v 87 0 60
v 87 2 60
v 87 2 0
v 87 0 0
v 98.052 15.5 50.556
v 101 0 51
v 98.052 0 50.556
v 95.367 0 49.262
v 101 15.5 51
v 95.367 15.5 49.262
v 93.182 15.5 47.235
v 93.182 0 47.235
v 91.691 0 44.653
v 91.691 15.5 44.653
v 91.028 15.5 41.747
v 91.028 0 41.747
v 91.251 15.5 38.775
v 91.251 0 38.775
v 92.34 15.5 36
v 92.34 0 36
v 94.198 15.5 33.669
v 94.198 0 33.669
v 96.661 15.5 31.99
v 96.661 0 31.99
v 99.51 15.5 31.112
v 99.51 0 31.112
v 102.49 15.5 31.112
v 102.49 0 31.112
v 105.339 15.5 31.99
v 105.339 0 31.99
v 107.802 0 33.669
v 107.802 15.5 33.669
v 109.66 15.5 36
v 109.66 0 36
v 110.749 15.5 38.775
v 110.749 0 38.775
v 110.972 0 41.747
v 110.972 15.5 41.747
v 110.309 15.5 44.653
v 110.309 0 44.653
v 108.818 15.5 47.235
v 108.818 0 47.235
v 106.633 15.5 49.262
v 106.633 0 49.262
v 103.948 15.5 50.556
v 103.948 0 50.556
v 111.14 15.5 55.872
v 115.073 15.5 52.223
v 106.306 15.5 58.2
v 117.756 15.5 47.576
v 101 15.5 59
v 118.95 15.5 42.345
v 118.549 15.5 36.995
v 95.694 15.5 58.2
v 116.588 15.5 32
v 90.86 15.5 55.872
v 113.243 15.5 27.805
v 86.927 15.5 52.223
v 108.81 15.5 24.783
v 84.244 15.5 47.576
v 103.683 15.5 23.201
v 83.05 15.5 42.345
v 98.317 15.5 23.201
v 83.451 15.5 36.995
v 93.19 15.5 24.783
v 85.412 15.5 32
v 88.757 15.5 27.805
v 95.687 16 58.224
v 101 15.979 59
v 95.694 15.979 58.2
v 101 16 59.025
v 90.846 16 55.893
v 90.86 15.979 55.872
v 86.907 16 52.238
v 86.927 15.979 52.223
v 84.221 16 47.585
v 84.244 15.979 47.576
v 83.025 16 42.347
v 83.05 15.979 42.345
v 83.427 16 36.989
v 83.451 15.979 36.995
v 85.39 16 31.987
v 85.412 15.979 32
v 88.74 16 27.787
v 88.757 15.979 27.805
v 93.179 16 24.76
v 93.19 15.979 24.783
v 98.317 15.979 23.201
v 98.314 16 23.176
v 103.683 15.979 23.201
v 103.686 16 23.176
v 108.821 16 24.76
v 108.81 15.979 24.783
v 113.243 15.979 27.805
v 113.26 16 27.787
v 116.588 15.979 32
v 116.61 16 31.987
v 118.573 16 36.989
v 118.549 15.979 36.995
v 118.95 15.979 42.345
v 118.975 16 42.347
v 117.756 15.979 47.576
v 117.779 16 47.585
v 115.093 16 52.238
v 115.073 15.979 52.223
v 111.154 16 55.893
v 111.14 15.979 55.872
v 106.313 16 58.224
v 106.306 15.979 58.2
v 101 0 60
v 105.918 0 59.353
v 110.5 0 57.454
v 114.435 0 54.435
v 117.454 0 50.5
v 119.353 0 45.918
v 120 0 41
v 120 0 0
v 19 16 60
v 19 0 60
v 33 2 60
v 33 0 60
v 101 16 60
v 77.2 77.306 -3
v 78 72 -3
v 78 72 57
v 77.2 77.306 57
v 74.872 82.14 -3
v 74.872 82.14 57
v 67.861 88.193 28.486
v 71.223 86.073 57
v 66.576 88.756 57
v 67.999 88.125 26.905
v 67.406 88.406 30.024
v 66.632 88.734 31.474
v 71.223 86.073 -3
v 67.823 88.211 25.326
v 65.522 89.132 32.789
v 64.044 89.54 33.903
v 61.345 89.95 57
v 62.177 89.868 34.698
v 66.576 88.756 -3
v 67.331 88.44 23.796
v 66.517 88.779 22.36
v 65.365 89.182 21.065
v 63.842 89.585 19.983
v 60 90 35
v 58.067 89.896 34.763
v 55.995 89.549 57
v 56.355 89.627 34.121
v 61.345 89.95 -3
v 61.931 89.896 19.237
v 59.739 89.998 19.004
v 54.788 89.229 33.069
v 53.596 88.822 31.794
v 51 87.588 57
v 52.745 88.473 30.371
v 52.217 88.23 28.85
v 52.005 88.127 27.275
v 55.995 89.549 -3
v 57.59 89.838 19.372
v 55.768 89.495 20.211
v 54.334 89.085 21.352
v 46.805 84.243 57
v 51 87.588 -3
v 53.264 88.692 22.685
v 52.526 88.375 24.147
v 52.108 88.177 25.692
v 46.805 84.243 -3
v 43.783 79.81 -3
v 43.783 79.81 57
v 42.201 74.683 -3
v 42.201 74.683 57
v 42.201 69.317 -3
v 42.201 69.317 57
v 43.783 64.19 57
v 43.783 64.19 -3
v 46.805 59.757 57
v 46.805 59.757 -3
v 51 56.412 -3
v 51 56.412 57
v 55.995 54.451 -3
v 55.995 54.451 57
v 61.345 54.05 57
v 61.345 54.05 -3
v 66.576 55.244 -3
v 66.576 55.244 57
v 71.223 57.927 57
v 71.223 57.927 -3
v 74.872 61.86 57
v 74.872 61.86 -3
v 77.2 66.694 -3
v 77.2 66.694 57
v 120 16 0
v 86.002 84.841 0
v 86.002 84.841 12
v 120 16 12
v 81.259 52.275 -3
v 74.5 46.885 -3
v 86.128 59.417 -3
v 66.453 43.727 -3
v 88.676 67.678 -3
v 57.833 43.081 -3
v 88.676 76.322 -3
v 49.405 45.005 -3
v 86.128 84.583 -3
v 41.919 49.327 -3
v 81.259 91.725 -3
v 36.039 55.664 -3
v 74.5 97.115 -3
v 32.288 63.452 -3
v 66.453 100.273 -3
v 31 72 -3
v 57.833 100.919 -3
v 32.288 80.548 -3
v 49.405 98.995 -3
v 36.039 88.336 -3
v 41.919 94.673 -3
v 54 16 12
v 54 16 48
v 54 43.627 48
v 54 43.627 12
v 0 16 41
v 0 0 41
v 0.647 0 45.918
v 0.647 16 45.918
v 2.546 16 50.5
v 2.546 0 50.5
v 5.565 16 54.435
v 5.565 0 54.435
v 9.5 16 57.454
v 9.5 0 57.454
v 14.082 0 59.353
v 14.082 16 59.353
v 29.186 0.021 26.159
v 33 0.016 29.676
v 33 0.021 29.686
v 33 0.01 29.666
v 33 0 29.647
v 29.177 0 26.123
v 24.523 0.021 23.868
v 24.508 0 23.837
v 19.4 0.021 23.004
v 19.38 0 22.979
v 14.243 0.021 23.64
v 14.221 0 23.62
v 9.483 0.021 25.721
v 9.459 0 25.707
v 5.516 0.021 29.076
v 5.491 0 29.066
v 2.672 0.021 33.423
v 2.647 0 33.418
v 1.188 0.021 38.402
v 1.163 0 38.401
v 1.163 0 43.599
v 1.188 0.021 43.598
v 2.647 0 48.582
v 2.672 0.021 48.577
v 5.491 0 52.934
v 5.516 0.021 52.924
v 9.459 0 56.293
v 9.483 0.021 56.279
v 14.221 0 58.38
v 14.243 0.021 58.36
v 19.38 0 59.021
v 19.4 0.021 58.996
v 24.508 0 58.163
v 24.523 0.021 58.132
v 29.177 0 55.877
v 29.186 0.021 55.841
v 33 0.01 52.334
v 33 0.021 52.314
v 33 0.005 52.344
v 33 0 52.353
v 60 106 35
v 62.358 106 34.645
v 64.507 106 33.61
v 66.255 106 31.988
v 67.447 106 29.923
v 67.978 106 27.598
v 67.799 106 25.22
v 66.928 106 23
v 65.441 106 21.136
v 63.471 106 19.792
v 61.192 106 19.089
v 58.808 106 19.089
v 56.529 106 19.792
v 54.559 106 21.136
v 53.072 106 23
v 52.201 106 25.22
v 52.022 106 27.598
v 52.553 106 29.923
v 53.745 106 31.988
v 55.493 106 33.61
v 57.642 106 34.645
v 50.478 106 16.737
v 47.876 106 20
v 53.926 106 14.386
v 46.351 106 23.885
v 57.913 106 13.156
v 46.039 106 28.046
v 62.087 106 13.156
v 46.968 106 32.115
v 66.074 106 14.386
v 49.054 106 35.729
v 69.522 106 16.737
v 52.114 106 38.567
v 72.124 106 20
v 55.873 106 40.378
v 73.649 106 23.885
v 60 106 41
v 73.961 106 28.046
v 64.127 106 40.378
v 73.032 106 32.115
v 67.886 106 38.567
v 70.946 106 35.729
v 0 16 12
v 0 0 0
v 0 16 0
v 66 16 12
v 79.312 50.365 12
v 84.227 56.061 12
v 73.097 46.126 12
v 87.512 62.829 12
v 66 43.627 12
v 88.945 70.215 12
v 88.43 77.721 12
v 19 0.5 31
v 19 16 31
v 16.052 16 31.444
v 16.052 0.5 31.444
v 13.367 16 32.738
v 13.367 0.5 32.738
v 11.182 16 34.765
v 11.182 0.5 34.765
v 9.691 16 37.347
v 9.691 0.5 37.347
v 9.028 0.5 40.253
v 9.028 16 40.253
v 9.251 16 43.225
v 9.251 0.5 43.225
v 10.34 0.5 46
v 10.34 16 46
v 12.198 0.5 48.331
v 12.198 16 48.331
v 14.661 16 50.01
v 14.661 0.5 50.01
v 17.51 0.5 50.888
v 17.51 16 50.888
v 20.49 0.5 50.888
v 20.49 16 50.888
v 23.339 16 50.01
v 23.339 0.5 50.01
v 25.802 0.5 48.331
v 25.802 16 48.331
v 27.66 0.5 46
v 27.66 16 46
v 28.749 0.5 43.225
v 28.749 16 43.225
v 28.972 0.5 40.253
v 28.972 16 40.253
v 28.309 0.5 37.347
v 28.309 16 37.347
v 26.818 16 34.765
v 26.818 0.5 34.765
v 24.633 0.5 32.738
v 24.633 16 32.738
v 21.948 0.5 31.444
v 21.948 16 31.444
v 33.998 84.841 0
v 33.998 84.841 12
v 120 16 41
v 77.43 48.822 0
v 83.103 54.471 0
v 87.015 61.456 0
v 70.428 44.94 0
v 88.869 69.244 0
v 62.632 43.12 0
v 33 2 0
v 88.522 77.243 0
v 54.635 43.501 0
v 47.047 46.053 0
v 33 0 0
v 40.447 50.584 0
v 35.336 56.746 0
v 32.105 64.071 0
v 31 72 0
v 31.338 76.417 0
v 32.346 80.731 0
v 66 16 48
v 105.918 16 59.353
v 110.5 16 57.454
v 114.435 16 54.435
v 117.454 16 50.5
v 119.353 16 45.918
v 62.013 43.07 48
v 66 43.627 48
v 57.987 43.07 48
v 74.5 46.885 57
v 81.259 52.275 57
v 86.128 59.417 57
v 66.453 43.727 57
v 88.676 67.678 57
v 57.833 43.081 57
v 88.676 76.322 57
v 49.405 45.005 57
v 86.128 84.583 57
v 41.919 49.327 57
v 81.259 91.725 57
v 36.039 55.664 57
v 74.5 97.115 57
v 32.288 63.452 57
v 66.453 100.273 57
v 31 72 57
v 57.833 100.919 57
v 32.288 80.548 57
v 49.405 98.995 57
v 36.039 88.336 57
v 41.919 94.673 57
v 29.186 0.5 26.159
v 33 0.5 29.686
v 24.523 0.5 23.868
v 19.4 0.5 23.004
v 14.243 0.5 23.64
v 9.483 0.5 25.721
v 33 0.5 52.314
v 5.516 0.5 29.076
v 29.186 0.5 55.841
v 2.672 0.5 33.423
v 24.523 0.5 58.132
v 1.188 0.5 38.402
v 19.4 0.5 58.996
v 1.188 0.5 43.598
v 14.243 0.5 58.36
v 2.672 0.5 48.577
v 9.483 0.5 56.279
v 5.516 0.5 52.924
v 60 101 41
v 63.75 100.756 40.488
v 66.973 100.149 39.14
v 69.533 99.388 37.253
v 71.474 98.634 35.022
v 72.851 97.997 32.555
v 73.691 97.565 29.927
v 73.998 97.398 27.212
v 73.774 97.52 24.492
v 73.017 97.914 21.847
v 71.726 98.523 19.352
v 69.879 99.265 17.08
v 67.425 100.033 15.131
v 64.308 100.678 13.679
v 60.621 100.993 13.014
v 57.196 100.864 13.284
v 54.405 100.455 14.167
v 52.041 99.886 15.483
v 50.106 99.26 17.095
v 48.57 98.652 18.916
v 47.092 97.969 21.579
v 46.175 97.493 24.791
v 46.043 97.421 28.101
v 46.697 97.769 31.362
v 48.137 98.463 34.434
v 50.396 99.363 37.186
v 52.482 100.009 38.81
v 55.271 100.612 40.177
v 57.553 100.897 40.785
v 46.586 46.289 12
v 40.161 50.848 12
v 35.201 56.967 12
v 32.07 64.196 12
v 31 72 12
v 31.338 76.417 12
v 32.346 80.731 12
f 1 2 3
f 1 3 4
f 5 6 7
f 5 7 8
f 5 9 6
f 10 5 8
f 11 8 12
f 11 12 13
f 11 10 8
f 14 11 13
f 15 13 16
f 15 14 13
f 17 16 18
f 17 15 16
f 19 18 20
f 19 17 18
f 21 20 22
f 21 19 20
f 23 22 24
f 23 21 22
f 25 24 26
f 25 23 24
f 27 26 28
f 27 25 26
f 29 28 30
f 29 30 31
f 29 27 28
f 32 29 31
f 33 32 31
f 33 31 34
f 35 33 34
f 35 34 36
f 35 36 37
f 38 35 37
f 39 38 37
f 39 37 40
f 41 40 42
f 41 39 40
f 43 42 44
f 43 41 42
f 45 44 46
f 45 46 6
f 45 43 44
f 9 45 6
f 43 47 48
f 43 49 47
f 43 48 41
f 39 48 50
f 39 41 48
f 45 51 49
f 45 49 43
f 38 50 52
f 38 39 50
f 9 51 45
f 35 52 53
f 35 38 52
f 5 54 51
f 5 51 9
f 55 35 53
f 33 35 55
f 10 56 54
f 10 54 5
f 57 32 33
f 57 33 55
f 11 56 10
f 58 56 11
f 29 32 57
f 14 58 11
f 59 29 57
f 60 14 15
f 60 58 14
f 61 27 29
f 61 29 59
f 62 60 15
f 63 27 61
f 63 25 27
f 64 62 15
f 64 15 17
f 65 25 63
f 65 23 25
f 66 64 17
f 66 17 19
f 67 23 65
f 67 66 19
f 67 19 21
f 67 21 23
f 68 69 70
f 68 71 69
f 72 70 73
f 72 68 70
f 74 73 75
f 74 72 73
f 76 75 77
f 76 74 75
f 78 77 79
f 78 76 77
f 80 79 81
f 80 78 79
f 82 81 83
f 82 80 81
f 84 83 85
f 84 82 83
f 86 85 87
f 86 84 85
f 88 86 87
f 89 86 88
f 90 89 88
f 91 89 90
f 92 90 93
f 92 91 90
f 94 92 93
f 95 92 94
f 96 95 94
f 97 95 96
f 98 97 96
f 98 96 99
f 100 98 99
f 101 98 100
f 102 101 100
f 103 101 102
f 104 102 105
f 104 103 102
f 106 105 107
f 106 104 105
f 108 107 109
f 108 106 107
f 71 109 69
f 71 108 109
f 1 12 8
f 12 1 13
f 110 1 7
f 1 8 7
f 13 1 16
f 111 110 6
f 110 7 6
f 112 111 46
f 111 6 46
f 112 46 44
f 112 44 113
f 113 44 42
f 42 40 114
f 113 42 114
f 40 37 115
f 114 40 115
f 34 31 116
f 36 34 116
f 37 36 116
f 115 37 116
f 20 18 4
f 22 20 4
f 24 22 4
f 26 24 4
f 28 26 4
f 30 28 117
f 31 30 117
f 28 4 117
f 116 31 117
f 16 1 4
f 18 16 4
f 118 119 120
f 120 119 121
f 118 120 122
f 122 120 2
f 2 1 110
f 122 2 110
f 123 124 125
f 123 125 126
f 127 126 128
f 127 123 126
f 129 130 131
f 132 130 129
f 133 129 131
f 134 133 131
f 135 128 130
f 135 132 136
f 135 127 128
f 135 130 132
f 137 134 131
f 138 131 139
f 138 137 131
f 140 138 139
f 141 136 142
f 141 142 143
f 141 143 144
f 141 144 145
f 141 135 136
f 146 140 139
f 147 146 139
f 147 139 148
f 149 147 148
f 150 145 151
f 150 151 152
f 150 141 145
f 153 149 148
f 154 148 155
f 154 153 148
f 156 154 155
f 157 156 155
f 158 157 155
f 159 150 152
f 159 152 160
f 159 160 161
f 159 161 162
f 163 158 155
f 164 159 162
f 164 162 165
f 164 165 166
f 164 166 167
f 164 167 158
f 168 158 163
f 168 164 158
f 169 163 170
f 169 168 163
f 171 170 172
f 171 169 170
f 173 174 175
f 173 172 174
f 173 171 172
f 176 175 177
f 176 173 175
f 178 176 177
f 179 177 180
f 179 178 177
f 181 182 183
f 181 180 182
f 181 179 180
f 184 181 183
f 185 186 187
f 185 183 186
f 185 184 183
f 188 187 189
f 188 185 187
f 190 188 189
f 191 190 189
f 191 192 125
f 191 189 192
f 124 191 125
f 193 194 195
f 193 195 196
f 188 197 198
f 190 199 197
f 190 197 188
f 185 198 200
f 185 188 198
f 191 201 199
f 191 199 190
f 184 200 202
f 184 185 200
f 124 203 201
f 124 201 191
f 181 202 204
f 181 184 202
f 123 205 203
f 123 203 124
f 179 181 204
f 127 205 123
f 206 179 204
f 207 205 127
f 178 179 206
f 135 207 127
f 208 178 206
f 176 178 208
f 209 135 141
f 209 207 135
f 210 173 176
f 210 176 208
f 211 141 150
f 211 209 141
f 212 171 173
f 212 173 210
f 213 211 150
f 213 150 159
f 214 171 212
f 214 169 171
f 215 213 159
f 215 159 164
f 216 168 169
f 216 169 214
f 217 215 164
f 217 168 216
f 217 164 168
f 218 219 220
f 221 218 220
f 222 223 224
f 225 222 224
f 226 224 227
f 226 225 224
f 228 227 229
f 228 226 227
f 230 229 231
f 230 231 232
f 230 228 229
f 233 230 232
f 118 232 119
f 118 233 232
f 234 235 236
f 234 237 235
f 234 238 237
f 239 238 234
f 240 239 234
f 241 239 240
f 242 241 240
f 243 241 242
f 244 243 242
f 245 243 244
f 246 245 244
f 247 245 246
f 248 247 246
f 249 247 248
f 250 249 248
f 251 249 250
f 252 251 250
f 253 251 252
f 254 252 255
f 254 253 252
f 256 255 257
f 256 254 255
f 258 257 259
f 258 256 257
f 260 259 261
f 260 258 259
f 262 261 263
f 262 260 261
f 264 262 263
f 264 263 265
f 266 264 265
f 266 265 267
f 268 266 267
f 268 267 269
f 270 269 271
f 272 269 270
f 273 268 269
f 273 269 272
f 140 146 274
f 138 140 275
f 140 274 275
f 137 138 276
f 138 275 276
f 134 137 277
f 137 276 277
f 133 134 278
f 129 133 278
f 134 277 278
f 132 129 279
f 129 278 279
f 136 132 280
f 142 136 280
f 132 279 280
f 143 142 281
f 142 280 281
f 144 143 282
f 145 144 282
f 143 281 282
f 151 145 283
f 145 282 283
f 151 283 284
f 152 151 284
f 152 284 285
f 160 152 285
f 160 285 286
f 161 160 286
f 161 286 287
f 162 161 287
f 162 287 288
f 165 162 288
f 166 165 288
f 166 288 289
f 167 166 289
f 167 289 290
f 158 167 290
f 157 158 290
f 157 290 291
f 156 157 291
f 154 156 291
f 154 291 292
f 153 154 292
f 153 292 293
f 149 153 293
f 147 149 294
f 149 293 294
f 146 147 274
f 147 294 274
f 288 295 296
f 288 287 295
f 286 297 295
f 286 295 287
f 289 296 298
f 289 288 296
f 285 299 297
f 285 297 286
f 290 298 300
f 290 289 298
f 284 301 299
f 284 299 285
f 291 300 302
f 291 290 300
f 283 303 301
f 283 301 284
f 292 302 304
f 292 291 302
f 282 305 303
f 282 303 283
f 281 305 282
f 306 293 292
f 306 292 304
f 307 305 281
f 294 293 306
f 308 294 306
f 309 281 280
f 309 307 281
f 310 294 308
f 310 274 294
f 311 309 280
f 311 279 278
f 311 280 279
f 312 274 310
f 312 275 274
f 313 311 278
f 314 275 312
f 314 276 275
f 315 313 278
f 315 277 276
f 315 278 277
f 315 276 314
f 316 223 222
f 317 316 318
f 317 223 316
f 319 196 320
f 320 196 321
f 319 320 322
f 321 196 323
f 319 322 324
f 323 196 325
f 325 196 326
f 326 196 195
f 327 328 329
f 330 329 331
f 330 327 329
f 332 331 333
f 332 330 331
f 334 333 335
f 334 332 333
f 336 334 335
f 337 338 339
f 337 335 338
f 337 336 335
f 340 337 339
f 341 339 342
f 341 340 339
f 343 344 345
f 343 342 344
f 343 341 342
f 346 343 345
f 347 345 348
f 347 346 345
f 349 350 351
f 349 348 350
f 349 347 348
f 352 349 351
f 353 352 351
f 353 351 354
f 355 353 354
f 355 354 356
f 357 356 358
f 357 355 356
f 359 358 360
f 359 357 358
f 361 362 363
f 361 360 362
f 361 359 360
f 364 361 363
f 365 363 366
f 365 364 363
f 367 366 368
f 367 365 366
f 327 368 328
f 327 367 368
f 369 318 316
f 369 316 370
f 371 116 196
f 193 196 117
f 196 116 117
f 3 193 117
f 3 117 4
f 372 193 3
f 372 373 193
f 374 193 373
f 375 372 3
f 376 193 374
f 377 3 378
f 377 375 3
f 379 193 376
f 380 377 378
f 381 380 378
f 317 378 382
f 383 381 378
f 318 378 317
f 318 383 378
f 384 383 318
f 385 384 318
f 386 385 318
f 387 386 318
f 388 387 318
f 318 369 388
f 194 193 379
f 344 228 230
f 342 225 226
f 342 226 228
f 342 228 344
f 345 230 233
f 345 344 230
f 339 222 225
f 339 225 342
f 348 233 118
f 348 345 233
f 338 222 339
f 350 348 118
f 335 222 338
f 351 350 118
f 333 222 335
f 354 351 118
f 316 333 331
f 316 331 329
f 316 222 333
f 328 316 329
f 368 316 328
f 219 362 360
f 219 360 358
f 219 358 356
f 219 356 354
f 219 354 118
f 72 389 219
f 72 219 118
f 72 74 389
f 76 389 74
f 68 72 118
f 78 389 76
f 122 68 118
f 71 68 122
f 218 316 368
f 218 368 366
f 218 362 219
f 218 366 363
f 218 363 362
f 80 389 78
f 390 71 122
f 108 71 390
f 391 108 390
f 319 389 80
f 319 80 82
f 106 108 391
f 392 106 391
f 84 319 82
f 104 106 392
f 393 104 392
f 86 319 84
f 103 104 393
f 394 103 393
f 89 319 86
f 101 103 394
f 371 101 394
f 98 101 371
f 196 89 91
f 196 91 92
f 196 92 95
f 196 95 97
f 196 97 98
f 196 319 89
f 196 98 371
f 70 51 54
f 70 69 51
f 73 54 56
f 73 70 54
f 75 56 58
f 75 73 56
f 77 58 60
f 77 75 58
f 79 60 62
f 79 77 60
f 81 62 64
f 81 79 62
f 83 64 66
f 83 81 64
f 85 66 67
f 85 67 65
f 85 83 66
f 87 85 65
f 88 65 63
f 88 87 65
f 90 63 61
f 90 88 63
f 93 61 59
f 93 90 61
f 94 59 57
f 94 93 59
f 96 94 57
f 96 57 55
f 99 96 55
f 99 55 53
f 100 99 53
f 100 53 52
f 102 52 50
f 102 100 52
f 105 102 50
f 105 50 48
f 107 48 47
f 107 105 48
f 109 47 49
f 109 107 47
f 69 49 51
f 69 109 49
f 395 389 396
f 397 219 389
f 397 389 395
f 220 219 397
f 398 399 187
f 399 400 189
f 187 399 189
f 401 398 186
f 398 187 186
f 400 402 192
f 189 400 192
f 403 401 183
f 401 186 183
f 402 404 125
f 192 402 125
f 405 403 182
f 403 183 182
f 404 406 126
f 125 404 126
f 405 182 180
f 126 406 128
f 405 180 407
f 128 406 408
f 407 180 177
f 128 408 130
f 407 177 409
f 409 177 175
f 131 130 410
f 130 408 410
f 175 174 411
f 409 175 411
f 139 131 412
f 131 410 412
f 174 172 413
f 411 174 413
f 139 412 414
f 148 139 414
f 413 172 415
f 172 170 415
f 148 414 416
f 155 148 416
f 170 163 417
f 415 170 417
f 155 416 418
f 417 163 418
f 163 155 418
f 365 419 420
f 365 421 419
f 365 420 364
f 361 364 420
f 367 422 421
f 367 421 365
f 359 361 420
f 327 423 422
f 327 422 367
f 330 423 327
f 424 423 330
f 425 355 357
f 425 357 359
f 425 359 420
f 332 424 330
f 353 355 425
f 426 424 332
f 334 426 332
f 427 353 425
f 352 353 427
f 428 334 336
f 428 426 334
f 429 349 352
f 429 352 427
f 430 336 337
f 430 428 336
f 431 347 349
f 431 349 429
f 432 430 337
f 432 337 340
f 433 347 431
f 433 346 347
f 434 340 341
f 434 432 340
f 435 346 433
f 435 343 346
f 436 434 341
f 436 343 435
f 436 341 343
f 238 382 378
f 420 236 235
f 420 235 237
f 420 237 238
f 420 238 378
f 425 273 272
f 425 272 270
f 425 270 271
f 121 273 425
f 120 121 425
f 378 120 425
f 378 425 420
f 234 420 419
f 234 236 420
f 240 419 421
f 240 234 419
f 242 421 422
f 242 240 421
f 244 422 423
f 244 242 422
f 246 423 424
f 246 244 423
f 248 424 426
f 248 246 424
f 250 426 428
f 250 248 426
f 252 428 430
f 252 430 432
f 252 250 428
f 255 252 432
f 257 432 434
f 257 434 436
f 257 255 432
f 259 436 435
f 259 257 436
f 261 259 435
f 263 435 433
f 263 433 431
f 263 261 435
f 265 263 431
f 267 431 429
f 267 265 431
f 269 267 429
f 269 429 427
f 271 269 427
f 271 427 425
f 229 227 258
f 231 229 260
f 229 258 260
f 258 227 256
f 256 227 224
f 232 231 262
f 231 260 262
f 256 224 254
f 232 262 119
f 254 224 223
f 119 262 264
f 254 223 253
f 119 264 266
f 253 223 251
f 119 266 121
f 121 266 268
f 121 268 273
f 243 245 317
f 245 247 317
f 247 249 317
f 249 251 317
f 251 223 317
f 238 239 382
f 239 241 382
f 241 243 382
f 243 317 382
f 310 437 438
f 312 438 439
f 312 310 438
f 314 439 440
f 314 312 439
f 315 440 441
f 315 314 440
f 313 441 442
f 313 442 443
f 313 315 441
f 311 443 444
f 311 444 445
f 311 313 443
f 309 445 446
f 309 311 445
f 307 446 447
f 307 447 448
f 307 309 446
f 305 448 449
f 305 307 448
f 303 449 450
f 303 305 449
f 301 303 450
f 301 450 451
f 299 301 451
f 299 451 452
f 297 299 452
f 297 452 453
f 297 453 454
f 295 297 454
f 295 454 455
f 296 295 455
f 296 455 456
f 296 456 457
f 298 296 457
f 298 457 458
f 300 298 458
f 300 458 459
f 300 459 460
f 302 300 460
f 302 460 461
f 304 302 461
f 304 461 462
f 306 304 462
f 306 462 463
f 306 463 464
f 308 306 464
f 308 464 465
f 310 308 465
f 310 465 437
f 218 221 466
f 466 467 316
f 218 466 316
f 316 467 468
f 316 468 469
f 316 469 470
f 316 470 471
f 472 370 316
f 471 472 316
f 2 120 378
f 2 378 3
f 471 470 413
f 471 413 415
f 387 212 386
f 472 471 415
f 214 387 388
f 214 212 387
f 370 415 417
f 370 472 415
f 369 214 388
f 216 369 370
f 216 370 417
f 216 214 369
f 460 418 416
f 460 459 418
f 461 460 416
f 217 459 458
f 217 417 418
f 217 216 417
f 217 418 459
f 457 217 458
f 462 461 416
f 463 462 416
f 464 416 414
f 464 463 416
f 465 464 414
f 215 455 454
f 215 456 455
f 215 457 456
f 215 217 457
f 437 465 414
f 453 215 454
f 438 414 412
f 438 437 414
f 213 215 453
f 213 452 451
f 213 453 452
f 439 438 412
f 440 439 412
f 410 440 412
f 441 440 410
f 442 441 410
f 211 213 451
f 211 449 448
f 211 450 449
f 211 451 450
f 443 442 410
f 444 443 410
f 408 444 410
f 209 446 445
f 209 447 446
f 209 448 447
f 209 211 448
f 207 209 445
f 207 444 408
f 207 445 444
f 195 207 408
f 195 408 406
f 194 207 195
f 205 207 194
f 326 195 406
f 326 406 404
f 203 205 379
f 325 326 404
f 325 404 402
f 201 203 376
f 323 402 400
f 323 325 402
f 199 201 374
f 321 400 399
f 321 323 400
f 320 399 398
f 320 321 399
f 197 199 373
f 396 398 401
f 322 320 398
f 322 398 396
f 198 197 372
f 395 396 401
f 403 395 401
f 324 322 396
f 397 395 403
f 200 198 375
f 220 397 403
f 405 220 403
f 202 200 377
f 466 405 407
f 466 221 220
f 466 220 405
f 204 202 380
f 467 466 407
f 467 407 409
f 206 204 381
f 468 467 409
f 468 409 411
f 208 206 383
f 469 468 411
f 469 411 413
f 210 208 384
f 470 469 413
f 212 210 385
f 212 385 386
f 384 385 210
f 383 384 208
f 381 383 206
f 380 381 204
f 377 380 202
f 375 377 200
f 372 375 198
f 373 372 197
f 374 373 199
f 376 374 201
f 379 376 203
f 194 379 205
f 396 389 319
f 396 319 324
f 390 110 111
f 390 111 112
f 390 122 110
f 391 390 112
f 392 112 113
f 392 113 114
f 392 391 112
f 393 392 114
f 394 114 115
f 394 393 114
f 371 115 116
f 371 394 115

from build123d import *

# Parameters (mm, degrees)
SKETCH_3_W               = 120
SKETCH_3_H               = 60
EXTRUDE_2_DEPTH          = 16
FILLET_3_R               = 19
SKETCH_4_R               = 29
EXTRUDE_3_DEPTH          = 60
CUT_EXTRUDE_1_DEPTH      = 168.931533668
CUT_EXTRUDE_1_DEPTH_BACK = 168.931533668
SKETCH_5_R               = 18
EXTRUDE_4_REACH          = 172.985
EXTRUDE_4_END_RADIUS     = 29
SKETCH_9_R               = 14
CUT_EXTRUDE_2_REACH      = 172.985
CUT_EXTRUDE_2_END_RADIUS = 18
SKETCH_10_R              = 8
EXTRUDE_8_DEPTH          = 12
RIB_26_REACH             = 137.779
SKETCH_14_WALL_W         = 300.558465316
SKETCH_14_WALL_H         = 12
CUT_EXTRUDE_3_DEPTH      = 173.06103578


with BuildPart() as part:
    # 草图3 → 凸台-拉伸2 (new body)
    with BuildSketch(Plane(origin=(0, 0, 0), x_dir=(1, 0, 0), z_dir=(0, 1, 0))):
        with Locations((60, -30)):
            Rectangle(SKETCH_3_W, SKETCH_3_H)
    extrude(amount=EXTRUDE_2_DEPTH)

    # 圆角3
    fillet_3_edges = [part.edges().sort_by_distance(p)[0] for p in [
        (120, 8, 60),
        (0, 8, 60),
    ]]
    fillet(fillet_3_edges, radius=FILLET_3_R)



with BuildPart() as body_2:
    # 草图4 → 凸台-拉伸3 (new body)
    with BuildSketch(Plane(origin=(0, 0, -3), x_dir=(-1, 0, 0), z_dir=(0, 0, -1))):
        with Locations((-60, 72)):
            Circle(SKETCH_4_R)
    extrude(amount=-EXTRUDE_3_DEPTH)

    # 草图5 → 切除-拉伸1 (cut, two sides: drawn at the far end of the back side and taken through both)
    with BuildSketch(Plane.XY.offset(57).offset(-CUT_EXTRUDE_1_DEPTH_BACK)):
        with Locations((60, 72)):
            Circle(SKETCH_5_R)
    extrude(amount=CUT_EXTRUDE_1_DEPTH + CUT_EXTRUDE_1_DEPTH_BACK, mode=Mode.SUBTRACT)

    # 凸台-拉伸4: up to this cylinder (the profile starts outside it)
    extrude_4_end = Plane(origin=(60, 72, 27), z_dir=(0, 0, -1)) * Cylinder(EXTRUDE_4_END_RADIUS, 404.97, mode=Mode.PRIVATE)
    # 草图9 → 凸台-拉伸4 (add, up to the surface)
    with BuildSketch(Plane(origin=(0, 106, 0), x_dir=(1, 0, 0), z_dir=(0, 1, 0)), mode=Mode.PRIVATE) as extrude_4_sk1:
        with Locations(Location((60, -27, 0), (0, 0, 270))):
            Circle(SKETCH_9_R)
    extrude_4_tool1 = extrude(extrude_4_sk1.sketch, amount=-EXTRUDE_4_REACH, mode=Mode.PRIVATE) - extrude_4_end
    add(extrude_4_tool1.solids().sort_by_distance((60, 106, 27))[0])

    # 切除-拉伸2: up to this cylinder (the profile starts outside it)
    cut_extrude_2_end = Plane(origin=(60, 72, 27), z_dir=(0, 0, 1)) * Cylinder(CUT_EXTRUDE_2_END_RADIUS, 382.97, mode=Mode.PRIVATE)
    # 草图10 → 切除-拉伸2 (cut, up to the surface)
    with BuildSketch(Plane(origin=(0, 106, 0), x_dir=(1, 0, 0), z_dir=(0, 1, 0)), mode=Mode.PRIVATE) as cut_extrude_2_sk1:
        with Locations(Location((60, -27, 0), (0, 0, 270))):
            Circle(SKETCH_10_R)
    cut_extrude_2_tool1 = extrude(cut_extrude_2_sk1.sketch, amount=-CUT_EXTRUDE_2_REACH, mode=Mode.PRIVATE) - cut_extrude_2_end
    add(cut_extrude_2_tool1.solids().sort_by_distance((60, 106, 27))[0], mode=Mode.SUBTRACT)


with BuildPart() as part_1:
    add(part.part)

    add(body_2.part)  # 凸台-拉伸8 merges body 2
    # 草图11 → 凸台-拉伸8 (add)
    with BuildSketch(Plane.XY):
        with BuildLine():
            ThreePointArc((33.99807912, 84.841343799), (60, 43), (86.00192088, 84.841343799))
            Line((86.00192088, 84.841343799), (120, 16))
            Line((120, 16), (0, 16))
            Line((0, 16), (33.99807912, 84.841343799))
        make_face()
    extrude(amount=EXTRUDE_8_DEPTH)

    # 草图14 wall → 筋26 (add, up to next)
    with BuildSketch(Plane(origin=(60, 29.5, 48), x_dir=(0, 1, 0), z_dir=(0, 0, 1)), mode=Mode.PRIVATE) as rib_26_sk1:
        Rectangle(SKETCH_14_WALL_W, SKETCH_14_WALL_H)
    rib_26_tool1 = extrude(rib_26_sk1.sketch, amount=-RIB_26_REACH, mode=Mode.PRIVATE) - part_1.part
    add(rib_26_tool1.solids().sort_by_distance((60, 29.5, 48))[0])

    # 草图16 → 切除-拉伸3 (cut, through all)
    with BuildSketch(Plane.XY.offset(60)):
        Polygon((33, 0), (33, 2), (87, 2), (87, 0), (60, 0), align=None)
    extrude(amount=-CUT_EXTRUDE_3_DEPTH, mode=Mode.SUBTRACT)

    # 草图20 → M18 六角头螺栓C级的柱形沉头孔1 (revolve, cut)
    with BuildSketch(Plane(origin=(101, 16, 41), x_dir=(0, 0, 1), z_dir=(1, 0, 0))):
        Polygon((0, 0), (0, 16), (10, 16), (10, 0.5), (18, 0.5), (18, 0.020977491), (18.025, 0), align=None)
    revolve(axis=Axis((101, 22.35, 41), (0, -1, 0)), mode=Mode.SUBTRACT)

    # 草图22 → M18 六角头螺栓C级的柱形沉头孔2 (revolve, cut)
    with BuildSketch(Plane(origin=(19, 0, 41), x_dir=(0, 0, -1), z_dir=(1, 0, 0))):
        Polygon((0, 0), (0, 106), (10, 106), (10, 0.5), (18, 0.5), (18, 0.020977491), (18.025, 0), align=None)
    revolve(axis=Axis((19, -6.35, 41), (0, 1, 0)), mode=Mode.SUBTRACT)


solid = part_1.part
